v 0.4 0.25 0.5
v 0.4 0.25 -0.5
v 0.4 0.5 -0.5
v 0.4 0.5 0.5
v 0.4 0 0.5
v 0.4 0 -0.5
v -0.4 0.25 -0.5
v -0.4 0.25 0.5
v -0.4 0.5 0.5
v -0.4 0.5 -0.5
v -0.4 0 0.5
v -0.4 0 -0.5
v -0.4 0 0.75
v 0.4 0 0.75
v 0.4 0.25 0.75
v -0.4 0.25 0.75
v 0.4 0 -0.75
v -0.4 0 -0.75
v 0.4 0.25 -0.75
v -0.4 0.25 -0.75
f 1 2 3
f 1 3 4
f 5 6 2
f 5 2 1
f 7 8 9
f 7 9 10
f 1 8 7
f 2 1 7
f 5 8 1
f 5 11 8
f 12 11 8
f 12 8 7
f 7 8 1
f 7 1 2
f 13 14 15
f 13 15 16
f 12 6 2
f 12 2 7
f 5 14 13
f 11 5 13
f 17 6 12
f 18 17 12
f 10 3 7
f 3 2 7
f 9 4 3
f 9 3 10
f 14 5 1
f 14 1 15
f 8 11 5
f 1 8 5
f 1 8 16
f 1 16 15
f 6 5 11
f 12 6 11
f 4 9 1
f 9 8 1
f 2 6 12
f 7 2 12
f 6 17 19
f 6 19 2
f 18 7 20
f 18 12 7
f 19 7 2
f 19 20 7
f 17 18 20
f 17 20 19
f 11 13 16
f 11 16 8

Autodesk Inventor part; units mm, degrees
ref_plane "YZ Plane" through (0, 0, 0) normal (1, 0, 0) x (0, 1, 0)
ref_plane "XZ Plane" through (0, 0, 0) normal (0, 1, 0) x (-1, 0, 0)
ref_plane "XY Plane" through (0, 0, 0) normal (0, 0, 1) x (1, 0, 0)
sketch "Sketch1" plane through (0, 0, 0) normal (0, 1, 0) x (-1, 0, 0)
  line L0 (-0.4, 0.75) -> (0.4, 0.75)
  line L1 (0.4, 0.75) -> (0.4, -0.75)
  line L2 (0.4, -0.75) -> (-0.4, -0.75)
  line L3 (-0.4, -0.75) -> (-0.4, 0.75)
  line L4 (-0.4, 0.75) -> (0.4, -0.75) construction
  line L5 (0.4, 0.75) -> (-0.4, -0.75) construction
  point P0 (0, 0)
  dimension "d0" = 0.8
  dimension "d1" = 1.5
extrude "Extrusion1" add sketch "Sketch1" along normal blind 0.5
sketch "Sketch2" plane through (0, 0.5, 0) normal (0, 1, 0) x (1, 0, 0)
  line L0 (0.4, -0.5) -> (-0.4, -0.5)
  line L1 (-0.4, -0.5) -> (0.4, -0.5)
  line L2 (0.4, -0.75) -> (0.4, 0.75) projected
  line L3 (-0.4, -0.5) -> (0.4, -0.5)
  line L4 (0.4, -0.5) -> (0.4, 0.5)
  line L5 (0.4, 0.5) -> (-0.4, 0.5)
  line L6 (-0.4, 0.5) -> (-0.4, -0.5)
  point P0 (0, 0)
  point P1 (-0.4, 0.75)
  point P2 (-0.4, -0.75)
  dimension "d6" = 1
split body "Split1" sketch "Sketch2" result two bodies curves L4 L5 L6 L3 first body at (0.1333, 0.1, 0.1667)
sketch "Sketch3" plane through (0, 0.5, 0) normal (0, 1, 0) x (1, 0, 0)
  line L0 (-0.8884, -1.0057) -> (0.9425, -1.0057)
  line L1 (0.9425, -1.0057) -> (0.9425, 1.4927)
  line L2 (0.9425, 1.4927) -> (-0.8884, 1.4927)
  line L3 (-0.8884, 1.4927) -> (-0.8884, -1.0057)
  point P0 (0, 0)
extrude "Extrusion2" cut sketch "Sketch3" against normal blind 0.25 bodies 3
sketch "Sketch4" plane through (0.4, 0, 0.5) normal (1, 0, 0) x (0, 0, -1)
  line L0 (0, 0.5) -> (0, 0) projected
  line L1 (1, 0.5) -> (1, 0) projected
  line L2 (0, 0.25) -> (1, 0.25)
  line L3 (1, 0.25) -> (1, 0)
  line L4 (1, 0) -> (0, 0)
  line L5 (0, 0) -> (0, 0.25)
  point P0 (0.5, 0)
split body "Split2" sketch "Sketch4" result two bodies bodies 2 curves L2 L3 L4 L5 first body at (0.1333, 0.4, 0.1667)
properties part number "Led_0603"
